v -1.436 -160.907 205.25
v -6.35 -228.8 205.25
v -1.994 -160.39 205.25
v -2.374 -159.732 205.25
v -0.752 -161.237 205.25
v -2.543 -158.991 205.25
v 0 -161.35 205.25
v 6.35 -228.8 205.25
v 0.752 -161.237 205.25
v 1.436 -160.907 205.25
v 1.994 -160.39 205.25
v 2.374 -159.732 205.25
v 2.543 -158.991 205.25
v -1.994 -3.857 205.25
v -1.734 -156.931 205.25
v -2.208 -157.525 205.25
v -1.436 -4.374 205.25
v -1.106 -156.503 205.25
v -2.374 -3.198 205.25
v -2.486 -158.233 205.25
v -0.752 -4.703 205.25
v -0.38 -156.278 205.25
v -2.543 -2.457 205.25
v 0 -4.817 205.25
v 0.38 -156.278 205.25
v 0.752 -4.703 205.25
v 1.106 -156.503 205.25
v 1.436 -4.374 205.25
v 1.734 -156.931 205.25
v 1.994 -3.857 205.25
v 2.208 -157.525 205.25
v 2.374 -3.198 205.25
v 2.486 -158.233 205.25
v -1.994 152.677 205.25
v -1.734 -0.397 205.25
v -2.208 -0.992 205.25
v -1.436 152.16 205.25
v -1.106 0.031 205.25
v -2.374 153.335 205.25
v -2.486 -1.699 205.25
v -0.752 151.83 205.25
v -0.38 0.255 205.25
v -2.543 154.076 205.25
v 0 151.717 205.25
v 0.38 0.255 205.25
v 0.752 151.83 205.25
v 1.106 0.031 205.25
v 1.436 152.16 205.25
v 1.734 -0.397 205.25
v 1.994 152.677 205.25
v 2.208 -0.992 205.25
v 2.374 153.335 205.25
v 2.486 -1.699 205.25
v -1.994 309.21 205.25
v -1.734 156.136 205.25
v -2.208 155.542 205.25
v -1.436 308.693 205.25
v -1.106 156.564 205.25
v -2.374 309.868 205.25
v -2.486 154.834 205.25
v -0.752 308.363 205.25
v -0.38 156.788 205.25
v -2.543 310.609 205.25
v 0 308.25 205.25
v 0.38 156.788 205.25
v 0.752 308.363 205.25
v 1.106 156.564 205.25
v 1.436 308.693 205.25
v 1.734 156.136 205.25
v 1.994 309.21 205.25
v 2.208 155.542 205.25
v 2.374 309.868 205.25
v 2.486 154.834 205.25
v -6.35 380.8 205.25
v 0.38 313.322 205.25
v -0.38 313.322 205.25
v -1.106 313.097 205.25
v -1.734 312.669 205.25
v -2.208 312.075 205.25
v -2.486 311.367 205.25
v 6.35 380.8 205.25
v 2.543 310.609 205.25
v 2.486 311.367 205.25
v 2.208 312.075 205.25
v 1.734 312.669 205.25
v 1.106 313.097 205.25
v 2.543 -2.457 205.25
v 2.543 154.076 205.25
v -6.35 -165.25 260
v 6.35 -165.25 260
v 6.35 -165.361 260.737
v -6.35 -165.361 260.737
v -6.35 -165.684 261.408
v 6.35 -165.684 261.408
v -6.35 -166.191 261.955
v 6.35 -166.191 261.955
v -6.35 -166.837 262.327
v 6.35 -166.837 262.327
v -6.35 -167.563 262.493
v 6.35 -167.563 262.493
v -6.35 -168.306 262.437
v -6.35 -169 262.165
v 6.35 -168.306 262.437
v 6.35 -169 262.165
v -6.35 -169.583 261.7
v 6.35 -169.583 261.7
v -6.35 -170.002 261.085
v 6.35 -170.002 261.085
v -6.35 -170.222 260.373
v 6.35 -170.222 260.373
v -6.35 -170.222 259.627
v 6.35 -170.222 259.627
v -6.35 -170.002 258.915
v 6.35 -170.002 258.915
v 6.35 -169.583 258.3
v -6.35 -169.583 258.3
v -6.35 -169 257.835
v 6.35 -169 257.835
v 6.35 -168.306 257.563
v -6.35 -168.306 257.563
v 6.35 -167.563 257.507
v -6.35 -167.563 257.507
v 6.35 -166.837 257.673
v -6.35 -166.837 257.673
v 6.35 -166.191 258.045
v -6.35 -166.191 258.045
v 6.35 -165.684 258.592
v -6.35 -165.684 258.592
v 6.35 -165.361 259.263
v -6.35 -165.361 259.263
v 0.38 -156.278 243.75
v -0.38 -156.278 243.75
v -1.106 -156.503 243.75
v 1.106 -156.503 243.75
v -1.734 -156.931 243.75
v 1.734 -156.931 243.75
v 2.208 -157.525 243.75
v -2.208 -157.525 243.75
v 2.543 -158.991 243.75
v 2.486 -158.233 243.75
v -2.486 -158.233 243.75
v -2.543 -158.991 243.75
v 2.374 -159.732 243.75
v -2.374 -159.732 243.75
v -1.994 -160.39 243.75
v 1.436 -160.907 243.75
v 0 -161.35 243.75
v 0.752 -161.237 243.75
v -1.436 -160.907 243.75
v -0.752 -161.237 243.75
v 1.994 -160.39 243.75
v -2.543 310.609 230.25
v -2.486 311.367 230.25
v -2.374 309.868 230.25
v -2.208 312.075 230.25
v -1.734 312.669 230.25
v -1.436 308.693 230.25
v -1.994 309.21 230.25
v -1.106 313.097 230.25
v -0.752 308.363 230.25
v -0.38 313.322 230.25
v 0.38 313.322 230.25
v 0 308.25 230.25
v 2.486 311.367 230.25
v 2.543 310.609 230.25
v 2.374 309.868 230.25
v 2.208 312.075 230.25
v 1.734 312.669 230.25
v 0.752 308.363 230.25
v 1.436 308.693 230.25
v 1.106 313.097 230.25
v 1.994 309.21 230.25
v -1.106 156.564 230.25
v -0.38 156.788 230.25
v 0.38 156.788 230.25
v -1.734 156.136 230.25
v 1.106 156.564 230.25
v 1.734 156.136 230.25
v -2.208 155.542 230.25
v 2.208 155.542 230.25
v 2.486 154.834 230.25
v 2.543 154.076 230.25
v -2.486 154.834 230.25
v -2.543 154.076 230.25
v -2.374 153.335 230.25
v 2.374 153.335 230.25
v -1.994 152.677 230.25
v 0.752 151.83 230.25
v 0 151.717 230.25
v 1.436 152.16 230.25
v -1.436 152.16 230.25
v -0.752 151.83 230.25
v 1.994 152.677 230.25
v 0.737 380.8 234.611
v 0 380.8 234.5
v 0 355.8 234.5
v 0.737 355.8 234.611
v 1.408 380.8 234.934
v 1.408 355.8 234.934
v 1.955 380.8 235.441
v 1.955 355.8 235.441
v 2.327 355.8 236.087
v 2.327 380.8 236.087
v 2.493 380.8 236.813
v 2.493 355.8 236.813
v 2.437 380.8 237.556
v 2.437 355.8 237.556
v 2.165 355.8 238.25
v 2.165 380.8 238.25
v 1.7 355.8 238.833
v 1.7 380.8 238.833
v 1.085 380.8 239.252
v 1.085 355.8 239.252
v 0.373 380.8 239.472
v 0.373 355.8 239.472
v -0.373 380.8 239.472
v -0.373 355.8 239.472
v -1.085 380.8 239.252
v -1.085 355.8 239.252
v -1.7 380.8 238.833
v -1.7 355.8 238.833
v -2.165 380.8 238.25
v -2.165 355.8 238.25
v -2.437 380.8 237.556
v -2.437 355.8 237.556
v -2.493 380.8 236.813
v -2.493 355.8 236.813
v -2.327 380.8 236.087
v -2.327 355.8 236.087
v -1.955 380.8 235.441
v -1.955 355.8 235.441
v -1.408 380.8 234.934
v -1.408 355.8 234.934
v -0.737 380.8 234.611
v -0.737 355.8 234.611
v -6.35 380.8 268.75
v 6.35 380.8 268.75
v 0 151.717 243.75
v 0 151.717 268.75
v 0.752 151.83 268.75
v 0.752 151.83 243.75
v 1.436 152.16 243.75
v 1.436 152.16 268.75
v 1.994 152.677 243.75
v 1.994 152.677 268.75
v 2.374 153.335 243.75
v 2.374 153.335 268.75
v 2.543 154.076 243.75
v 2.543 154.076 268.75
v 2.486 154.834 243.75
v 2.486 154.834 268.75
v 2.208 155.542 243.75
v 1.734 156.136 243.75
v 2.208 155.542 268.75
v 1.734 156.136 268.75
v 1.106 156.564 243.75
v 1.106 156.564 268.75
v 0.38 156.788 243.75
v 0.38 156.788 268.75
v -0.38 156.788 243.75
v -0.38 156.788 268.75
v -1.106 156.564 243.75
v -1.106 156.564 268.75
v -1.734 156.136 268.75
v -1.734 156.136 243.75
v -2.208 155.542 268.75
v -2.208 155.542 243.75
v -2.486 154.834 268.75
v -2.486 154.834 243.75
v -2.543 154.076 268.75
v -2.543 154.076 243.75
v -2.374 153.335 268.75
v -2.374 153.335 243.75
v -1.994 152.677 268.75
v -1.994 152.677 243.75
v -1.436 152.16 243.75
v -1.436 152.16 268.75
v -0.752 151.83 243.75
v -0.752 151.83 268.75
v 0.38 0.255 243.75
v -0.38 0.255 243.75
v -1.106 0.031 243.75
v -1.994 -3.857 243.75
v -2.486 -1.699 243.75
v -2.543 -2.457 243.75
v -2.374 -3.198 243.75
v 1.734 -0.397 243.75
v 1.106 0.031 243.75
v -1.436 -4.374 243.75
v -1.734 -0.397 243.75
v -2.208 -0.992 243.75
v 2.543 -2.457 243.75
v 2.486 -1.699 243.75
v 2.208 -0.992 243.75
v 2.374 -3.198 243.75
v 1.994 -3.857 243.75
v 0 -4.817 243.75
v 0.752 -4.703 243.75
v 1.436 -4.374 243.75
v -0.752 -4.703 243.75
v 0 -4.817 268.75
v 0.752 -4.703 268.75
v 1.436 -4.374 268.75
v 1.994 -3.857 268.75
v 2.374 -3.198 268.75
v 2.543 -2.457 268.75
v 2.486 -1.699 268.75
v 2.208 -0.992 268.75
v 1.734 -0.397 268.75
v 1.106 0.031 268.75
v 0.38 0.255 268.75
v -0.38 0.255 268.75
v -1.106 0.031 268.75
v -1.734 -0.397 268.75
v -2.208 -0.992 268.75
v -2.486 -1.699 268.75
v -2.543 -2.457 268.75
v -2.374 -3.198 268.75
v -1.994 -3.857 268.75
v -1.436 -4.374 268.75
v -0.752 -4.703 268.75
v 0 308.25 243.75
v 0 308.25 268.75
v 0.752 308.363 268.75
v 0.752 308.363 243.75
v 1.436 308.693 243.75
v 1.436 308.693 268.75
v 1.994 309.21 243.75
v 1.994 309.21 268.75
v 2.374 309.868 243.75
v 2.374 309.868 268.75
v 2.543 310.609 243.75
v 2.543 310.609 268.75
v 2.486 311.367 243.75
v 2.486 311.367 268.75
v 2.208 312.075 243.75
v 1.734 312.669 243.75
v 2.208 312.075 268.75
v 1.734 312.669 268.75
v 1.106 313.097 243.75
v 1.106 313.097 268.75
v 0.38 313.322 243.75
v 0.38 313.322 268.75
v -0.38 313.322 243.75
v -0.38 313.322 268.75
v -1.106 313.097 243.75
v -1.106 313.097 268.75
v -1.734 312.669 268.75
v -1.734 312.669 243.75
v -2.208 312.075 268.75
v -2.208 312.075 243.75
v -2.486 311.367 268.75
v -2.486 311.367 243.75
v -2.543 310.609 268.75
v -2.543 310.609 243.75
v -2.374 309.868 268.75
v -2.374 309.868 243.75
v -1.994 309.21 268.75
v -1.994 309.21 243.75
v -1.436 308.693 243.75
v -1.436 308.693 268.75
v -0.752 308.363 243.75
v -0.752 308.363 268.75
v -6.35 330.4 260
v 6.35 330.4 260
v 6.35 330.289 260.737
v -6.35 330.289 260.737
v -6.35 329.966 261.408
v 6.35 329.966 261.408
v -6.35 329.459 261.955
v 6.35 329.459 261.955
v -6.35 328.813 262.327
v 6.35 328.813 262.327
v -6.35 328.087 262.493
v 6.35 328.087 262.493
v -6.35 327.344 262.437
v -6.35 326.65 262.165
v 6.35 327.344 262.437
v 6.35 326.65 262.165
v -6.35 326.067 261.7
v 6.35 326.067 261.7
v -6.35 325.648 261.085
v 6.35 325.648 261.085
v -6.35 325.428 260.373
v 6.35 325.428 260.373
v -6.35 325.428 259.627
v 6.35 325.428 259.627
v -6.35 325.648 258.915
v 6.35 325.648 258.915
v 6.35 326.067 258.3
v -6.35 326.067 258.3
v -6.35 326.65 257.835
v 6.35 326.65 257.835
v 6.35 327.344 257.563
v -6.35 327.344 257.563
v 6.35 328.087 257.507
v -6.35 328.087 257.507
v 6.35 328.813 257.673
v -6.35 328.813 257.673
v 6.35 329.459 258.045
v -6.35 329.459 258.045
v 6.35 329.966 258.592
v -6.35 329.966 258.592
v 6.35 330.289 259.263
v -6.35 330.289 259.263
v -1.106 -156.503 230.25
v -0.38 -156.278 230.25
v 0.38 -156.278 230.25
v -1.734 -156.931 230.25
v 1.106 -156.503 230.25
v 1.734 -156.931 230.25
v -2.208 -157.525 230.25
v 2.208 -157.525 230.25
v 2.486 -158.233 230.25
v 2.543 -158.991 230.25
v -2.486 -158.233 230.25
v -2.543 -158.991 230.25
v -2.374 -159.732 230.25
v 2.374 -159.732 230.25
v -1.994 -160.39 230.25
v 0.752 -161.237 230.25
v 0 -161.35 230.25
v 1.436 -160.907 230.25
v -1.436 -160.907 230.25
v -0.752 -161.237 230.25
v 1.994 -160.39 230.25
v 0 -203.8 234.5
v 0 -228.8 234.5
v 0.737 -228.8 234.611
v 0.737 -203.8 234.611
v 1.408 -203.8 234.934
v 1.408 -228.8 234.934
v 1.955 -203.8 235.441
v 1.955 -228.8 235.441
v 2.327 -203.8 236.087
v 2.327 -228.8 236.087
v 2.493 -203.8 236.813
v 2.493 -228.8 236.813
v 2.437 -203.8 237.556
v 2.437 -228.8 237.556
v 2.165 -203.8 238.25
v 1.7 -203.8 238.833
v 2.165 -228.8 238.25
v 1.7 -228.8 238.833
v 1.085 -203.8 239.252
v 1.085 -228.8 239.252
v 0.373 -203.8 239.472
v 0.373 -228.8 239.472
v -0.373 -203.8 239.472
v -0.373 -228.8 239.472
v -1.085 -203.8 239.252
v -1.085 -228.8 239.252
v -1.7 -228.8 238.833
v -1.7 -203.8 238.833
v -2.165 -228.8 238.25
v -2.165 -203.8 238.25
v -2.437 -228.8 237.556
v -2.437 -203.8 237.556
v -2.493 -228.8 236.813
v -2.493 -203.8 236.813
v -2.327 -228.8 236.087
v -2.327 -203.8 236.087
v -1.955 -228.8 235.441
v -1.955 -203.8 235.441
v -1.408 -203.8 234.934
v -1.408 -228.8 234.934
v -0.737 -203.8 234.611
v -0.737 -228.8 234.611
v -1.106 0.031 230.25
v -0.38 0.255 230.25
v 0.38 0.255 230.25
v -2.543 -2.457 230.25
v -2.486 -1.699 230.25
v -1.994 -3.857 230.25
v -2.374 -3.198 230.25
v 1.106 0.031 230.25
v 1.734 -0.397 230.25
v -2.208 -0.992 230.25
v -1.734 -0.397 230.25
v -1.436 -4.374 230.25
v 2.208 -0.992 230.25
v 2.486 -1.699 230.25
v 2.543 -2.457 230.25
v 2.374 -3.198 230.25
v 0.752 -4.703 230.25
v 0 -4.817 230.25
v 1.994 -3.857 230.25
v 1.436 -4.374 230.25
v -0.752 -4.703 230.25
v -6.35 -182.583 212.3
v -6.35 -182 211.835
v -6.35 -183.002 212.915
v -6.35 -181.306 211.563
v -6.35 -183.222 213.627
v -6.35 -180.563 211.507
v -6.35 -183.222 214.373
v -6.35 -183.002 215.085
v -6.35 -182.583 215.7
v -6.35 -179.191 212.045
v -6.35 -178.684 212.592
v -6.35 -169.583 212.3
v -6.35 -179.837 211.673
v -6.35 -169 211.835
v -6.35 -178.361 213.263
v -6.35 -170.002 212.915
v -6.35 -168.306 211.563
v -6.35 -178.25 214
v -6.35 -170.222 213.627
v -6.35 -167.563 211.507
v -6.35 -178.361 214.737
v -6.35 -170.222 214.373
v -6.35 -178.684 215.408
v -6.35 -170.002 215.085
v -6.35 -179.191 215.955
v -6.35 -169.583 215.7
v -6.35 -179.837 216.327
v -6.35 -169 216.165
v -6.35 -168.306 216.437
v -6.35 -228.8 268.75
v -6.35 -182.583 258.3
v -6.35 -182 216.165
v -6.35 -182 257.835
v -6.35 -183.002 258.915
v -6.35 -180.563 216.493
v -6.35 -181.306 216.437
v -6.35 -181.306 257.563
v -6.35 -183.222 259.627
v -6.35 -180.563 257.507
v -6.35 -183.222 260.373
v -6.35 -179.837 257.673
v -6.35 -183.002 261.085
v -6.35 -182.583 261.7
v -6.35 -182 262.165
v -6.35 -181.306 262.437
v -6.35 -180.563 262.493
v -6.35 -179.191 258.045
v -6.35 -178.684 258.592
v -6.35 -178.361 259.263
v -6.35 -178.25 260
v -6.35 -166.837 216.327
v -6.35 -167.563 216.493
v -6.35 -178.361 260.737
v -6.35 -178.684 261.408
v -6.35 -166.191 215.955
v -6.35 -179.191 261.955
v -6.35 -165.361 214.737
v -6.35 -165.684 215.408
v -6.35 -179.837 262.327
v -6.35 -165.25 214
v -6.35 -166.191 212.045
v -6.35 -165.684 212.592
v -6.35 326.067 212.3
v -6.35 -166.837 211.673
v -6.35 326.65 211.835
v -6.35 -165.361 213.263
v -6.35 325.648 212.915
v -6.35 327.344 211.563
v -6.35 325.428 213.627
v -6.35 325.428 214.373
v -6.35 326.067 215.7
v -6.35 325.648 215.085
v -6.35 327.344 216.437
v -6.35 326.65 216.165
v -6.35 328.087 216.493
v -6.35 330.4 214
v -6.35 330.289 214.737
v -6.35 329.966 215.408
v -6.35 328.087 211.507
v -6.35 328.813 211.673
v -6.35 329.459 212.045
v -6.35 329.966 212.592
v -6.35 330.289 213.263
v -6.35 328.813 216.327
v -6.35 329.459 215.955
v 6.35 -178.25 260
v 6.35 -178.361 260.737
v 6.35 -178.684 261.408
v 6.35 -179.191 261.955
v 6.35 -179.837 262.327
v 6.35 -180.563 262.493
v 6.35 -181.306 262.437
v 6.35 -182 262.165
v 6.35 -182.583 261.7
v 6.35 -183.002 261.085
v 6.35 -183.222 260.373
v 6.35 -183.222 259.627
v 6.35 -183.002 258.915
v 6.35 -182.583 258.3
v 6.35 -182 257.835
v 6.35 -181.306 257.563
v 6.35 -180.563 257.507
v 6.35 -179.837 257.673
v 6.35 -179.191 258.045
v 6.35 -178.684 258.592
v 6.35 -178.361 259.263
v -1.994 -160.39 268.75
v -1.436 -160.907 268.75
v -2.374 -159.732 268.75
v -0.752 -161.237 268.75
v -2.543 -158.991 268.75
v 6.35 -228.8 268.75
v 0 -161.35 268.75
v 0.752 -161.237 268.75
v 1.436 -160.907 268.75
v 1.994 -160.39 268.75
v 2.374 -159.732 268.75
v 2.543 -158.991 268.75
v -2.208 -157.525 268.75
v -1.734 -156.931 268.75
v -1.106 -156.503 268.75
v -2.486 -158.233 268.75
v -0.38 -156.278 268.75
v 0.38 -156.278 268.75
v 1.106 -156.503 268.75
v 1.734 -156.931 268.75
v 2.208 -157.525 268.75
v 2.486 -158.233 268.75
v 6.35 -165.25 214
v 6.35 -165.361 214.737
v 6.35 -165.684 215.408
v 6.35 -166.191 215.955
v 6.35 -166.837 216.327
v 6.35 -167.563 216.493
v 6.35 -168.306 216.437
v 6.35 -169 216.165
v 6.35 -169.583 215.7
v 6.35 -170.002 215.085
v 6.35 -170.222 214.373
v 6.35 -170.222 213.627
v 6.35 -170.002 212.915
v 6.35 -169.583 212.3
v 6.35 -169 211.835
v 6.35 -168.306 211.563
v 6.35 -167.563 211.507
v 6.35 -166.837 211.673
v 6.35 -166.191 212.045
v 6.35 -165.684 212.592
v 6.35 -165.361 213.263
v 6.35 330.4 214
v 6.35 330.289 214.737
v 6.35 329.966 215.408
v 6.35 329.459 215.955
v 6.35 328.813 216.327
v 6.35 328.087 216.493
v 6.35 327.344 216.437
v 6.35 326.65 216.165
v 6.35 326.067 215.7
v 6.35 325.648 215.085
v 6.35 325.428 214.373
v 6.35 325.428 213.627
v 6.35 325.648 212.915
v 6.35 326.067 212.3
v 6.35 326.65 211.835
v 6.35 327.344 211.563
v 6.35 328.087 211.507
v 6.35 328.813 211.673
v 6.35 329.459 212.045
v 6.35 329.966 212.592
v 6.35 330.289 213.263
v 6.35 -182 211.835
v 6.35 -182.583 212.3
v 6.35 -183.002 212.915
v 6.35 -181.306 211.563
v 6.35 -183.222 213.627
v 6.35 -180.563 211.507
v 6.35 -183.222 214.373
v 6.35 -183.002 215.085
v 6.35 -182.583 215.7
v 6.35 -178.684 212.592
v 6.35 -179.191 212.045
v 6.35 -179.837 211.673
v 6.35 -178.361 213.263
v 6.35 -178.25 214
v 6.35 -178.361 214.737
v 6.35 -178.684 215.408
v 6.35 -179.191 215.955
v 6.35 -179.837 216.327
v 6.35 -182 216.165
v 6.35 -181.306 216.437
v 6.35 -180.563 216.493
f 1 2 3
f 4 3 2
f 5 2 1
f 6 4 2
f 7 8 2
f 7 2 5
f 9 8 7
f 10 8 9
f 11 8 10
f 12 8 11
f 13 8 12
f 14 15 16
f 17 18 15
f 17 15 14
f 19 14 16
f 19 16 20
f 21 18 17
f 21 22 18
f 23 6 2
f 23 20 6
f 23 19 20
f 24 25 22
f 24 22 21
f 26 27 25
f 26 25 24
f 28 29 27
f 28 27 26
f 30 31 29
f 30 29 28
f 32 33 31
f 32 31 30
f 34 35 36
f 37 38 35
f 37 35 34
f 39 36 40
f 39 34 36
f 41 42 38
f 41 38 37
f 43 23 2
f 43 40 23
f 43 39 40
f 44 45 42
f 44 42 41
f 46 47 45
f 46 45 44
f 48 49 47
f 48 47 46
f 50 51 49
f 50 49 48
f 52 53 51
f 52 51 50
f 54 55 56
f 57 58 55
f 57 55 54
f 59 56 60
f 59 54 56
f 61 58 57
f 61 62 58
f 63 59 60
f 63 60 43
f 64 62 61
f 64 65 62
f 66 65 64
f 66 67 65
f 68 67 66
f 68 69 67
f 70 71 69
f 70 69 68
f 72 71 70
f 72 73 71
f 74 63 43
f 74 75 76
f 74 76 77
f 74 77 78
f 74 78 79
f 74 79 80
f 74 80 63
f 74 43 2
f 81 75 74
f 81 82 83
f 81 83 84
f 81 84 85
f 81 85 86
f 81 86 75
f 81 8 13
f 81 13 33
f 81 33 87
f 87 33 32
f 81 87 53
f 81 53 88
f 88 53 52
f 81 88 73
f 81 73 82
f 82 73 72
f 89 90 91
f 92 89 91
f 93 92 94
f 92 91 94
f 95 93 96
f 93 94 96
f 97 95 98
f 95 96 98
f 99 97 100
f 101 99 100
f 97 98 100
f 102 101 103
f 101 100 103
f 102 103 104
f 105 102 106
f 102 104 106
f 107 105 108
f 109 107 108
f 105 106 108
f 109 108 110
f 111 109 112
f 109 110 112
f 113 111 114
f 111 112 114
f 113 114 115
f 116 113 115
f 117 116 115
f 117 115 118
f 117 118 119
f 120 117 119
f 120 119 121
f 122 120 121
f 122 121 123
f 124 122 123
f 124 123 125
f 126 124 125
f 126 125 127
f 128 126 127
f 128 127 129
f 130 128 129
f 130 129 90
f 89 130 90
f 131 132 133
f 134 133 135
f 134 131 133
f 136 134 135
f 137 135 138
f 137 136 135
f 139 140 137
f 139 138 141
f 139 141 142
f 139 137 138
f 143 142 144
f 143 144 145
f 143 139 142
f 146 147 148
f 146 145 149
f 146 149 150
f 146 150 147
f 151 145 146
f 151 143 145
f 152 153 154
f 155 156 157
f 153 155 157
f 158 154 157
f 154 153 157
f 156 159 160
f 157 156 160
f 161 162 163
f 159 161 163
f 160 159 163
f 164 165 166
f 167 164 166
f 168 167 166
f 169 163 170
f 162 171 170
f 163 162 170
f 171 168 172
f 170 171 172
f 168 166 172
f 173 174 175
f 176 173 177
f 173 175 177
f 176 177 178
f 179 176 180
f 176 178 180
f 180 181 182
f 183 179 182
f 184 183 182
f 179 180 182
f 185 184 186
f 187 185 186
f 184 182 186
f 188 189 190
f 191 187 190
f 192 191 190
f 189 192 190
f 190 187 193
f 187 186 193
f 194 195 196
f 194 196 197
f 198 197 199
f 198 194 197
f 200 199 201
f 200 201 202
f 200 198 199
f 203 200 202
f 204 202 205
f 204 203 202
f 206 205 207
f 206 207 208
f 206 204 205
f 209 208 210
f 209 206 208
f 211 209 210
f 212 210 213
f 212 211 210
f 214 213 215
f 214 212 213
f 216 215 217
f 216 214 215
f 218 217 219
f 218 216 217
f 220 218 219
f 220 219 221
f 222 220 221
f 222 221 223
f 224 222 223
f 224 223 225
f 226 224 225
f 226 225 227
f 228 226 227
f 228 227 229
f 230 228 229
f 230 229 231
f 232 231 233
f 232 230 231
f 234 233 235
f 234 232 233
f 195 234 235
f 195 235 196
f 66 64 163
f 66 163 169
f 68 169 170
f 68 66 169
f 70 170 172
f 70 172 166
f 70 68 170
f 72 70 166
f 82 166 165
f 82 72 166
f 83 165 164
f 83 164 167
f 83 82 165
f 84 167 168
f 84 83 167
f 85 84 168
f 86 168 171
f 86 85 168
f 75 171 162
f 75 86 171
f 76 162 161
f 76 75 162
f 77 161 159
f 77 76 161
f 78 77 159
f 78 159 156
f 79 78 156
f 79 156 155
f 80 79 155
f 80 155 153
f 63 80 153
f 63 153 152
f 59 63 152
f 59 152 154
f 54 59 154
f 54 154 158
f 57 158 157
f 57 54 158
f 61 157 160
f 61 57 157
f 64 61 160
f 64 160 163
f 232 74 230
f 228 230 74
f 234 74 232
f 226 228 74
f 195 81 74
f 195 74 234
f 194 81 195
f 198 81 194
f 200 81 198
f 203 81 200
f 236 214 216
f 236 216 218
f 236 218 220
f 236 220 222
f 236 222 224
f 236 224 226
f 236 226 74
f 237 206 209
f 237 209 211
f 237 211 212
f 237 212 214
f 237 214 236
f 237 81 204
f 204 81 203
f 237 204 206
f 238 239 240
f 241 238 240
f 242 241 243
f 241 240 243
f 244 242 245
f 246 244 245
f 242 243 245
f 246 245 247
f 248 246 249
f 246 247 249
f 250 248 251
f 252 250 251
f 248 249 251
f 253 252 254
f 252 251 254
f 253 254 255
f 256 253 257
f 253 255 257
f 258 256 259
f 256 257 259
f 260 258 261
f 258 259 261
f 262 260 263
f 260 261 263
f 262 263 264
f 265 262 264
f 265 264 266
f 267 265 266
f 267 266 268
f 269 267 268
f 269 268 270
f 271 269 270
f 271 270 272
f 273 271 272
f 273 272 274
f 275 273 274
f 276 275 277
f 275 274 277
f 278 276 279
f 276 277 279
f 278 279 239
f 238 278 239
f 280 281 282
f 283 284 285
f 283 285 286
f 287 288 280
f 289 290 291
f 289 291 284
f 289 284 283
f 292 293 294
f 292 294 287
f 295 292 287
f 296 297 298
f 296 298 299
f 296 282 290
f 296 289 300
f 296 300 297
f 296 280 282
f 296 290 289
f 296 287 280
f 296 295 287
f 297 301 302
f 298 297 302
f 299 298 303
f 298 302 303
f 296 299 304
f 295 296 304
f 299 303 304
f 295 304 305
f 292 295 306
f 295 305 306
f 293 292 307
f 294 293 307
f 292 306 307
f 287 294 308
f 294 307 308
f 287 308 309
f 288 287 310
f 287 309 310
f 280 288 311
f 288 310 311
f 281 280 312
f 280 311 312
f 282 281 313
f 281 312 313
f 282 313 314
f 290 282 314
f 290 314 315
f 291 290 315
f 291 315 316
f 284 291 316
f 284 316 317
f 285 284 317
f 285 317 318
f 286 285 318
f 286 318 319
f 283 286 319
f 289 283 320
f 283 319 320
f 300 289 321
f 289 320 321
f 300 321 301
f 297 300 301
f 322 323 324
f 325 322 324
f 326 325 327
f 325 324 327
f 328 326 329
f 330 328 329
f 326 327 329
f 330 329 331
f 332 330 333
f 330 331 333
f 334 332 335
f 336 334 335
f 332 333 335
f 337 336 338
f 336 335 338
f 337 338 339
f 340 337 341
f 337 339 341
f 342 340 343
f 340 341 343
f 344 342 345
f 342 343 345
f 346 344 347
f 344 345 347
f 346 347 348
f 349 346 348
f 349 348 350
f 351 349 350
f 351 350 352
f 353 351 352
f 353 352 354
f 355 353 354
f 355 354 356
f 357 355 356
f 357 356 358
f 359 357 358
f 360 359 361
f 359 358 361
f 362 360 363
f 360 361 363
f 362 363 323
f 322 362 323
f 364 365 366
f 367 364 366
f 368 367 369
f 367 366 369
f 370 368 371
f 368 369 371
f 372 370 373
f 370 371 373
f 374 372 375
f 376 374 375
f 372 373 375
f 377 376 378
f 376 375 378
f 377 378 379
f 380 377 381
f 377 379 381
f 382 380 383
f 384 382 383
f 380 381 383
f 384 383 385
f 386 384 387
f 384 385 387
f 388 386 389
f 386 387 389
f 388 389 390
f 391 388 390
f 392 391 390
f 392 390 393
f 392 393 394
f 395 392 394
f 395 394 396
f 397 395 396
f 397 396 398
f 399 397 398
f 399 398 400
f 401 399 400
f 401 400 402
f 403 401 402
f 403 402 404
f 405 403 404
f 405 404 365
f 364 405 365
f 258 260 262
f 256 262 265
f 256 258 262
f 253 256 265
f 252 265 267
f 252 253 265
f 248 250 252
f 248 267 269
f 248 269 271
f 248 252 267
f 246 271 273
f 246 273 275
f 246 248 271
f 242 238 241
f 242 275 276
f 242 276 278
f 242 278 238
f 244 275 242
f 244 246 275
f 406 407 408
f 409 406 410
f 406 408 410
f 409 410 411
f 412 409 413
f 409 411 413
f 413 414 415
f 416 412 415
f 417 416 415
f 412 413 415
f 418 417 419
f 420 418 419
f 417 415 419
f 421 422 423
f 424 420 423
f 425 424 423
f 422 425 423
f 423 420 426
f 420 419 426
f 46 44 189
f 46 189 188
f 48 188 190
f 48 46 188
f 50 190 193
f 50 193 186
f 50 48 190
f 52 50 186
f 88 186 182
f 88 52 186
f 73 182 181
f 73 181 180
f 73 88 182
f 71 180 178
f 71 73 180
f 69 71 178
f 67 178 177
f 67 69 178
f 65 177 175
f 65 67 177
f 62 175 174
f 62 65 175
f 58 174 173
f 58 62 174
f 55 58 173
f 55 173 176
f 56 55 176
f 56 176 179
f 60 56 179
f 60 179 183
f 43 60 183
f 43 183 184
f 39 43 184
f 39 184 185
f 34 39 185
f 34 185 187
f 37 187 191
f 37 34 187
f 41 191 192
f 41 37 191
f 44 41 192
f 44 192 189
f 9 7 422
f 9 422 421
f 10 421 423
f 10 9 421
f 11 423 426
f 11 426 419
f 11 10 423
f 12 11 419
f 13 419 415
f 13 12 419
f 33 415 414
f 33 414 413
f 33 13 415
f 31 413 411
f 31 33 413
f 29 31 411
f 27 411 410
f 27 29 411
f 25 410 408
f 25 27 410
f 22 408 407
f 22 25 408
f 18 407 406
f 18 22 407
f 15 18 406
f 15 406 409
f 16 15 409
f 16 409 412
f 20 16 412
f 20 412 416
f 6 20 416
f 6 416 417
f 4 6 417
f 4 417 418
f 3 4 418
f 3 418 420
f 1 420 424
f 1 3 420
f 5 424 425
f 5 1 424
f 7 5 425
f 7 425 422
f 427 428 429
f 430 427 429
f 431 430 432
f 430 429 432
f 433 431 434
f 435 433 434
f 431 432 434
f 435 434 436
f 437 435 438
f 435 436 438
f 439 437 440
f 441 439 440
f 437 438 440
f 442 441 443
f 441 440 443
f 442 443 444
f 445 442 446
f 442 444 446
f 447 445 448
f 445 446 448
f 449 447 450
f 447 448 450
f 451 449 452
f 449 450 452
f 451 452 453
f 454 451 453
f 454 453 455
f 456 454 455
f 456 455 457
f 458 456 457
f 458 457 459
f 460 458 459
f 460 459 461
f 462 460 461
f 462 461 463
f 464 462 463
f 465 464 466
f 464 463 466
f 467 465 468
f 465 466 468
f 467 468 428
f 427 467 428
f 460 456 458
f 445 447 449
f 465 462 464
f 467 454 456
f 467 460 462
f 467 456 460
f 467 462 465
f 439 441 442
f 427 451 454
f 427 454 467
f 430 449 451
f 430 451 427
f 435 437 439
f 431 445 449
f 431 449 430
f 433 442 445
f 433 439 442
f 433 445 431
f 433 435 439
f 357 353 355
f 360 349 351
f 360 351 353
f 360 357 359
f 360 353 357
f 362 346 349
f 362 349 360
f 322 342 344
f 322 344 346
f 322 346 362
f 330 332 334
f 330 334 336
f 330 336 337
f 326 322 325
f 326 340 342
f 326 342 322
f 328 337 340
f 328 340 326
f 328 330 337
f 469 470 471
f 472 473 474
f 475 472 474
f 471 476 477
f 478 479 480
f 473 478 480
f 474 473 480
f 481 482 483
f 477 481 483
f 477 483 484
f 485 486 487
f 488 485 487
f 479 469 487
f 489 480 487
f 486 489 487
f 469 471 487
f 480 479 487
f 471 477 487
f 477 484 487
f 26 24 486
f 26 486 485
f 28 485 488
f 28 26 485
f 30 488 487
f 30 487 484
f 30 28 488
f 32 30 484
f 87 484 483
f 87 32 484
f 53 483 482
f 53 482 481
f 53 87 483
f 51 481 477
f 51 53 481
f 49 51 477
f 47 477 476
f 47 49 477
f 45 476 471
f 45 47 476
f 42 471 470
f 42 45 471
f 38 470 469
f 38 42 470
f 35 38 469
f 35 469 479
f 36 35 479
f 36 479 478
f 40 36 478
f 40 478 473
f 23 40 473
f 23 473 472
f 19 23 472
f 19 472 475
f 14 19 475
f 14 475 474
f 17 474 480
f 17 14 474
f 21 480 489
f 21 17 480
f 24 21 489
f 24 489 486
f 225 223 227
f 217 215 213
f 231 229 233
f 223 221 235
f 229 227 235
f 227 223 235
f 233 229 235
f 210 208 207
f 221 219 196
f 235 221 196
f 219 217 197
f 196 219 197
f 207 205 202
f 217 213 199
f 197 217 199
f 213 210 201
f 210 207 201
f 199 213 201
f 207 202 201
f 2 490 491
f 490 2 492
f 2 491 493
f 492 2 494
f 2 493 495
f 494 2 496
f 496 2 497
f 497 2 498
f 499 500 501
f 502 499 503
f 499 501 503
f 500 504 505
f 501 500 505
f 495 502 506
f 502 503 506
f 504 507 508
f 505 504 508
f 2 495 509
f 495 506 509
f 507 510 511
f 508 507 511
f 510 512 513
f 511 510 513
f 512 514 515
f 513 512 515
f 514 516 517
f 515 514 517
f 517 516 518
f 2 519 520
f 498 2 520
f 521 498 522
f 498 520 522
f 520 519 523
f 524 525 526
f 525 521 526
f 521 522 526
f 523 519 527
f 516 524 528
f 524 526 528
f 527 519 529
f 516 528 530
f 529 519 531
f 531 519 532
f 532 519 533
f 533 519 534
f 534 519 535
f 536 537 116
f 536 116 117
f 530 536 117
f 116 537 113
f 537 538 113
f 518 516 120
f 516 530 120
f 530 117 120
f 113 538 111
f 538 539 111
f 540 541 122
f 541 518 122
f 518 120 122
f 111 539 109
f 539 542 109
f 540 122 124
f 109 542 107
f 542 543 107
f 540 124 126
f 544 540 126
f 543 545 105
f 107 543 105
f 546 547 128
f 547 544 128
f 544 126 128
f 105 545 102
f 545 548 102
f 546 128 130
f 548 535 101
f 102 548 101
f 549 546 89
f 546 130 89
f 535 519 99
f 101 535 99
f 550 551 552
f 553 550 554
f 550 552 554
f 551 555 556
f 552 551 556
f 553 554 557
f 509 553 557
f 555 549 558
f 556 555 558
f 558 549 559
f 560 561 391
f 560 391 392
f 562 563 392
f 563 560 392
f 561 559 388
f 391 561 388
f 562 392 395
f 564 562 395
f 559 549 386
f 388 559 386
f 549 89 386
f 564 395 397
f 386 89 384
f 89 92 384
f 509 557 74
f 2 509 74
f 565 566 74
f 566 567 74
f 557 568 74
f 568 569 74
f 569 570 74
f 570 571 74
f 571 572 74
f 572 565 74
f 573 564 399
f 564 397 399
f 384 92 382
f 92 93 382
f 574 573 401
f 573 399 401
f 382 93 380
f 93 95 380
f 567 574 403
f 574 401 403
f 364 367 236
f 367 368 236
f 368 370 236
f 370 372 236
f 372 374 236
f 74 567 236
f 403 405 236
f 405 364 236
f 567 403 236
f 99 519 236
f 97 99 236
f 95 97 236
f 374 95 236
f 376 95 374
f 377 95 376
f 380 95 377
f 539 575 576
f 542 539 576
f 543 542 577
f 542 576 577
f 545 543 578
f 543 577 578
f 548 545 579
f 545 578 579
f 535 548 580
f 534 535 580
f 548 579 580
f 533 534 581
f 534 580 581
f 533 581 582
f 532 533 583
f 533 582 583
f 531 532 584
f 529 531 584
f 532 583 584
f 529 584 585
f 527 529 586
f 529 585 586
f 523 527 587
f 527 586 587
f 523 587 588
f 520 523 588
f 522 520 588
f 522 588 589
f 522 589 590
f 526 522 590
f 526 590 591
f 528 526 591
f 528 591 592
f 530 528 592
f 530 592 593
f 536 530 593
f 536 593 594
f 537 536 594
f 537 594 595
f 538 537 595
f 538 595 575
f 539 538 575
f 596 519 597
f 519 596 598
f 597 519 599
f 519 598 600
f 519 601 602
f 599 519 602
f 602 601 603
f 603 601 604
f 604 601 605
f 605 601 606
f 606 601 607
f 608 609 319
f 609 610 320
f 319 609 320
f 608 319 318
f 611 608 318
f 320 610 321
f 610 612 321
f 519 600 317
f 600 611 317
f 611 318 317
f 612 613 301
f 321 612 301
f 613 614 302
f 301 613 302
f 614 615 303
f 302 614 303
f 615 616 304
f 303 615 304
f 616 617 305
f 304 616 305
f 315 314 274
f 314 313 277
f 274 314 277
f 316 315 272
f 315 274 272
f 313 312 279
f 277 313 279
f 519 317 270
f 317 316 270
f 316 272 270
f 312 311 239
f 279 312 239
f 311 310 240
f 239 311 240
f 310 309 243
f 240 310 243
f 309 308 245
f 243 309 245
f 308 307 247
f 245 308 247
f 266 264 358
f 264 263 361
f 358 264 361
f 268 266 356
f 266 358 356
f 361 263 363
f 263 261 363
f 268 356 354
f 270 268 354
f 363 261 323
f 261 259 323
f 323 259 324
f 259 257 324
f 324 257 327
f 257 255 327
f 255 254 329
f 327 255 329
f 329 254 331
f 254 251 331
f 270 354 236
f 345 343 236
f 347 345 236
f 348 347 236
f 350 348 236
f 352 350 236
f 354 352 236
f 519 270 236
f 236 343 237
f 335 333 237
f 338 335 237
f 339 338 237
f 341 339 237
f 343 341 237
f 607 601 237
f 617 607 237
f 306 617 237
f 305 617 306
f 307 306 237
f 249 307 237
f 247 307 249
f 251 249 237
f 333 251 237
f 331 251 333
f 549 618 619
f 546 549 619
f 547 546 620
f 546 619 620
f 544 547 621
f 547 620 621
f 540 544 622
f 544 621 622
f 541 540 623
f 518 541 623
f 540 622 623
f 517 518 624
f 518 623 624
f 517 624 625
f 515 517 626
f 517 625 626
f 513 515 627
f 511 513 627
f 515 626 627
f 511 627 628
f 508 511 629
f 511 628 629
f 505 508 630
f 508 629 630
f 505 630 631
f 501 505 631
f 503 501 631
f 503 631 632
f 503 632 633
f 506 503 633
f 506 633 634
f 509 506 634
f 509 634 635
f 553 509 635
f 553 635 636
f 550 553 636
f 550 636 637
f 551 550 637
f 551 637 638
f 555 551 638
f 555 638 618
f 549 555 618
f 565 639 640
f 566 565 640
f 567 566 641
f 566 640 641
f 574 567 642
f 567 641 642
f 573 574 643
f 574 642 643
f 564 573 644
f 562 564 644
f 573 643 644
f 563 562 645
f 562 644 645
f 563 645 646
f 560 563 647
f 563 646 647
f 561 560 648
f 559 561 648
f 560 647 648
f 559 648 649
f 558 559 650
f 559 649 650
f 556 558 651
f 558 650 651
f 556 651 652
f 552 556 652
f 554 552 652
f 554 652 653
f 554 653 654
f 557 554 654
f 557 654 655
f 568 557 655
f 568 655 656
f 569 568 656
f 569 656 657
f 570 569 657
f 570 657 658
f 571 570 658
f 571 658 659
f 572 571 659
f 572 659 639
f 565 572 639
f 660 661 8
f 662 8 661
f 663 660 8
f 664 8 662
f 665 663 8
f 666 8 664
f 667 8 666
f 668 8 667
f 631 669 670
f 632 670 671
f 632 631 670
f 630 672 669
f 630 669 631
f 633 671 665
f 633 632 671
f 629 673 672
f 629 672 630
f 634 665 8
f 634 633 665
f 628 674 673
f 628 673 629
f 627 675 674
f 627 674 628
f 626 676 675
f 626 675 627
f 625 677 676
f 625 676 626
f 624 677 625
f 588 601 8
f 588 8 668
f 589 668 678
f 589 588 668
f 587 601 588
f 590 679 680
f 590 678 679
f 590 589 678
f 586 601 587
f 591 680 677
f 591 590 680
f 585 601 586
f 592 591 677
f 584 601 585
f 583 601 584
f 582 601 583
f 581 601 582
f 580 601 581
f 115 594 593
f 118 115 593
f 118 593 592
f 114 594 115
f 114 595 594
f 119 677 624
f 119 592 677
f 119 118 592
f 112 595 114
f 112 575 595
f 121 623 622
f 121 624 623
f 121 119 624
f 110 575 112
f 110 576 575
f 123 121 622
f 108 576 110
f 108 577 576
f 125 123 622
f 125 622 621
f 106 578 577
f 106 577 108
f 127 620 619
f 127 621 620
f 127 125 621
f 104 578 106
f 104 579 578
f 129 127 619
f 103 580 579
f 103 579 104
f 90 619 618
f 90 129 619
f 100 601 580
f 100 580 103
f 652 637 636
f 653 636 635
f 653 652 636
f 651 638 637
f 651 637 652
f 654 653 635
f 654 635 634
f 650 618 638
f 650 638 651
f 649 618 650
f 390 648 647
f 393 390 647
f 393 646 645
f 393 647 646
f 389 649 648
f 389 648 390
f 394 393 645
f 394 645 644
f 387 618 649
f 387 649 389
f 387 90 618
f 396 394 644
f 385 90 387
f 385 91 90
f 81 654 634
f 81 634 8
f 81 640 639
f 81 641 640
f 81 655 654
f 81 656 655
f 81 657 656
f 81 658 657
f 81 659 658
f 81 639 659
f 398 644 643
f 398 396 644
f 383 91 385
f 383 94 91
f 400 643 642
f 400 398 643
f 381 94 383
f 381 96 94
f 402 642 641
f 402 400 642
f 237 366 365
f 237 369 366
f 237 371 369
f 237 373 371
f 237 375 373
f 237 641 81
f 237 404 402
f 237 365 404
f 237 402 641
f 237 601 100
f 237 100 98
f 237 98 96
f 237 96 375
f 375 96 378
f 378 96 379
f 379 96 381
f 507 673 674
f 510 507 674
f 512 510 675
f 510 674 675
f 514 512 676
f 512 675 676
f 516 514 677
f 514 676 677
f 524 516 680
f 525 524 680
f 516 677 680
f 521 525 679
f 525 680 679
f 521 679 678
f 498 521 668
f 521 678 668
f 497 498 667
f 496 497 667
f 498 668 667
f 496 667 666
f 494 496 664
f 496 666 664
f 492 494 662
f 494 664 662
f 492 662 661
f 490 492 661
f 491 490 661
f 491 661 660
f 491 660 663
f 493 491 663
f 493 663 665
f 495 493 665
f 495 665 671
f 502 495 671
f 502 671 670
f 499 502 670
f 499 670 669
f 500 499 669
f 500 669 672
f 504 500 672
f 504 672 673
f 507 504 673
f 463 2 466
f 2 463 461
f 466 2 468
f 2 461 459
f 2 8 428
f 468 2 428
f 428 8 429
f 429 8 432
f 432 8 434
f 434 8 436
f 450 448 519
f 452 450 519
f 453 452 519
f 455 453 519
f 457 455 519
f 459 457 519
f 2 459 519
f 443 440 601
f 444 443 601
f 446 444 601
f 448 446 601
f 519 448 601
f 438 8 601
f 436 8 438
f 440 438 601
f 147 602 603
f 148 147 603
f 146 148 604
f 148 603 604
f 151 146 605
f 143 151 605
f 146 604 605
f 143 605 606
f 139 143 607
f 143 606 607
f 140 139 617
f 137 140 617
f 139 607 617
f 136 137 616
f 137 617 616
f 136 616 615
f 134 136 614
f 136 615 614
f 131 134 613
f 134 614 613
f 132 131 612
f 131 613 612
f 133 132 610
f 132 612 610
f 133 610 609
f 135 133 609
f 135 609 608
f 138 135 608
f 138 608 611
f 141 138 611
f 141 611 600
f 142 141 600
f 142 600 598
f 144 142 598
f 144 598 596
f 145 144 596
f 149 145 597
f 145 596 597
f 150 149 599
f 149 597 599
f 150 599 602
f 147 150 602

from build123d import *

# Parameters (mm, degrees)
SKETCH006_W     = 609.6
SKETCH006_H     = 63.5
PAD002_DEPTH    = 6.35
SKETCH007_R     = 2.5
POCKET001_DEPTH = 25
SKETCH008_R     = 2.55
POCKET002_DEPTH = 25
SKETCH016_R     = 2.5
POCKET007_DEPTH = 12.701


with BuildPart() as part:
    # Sketch006 → Pad002 (new body, symmetric)
    with BuildSketch(Plane.YZ):
        Rectangle(SKETCH006_W, SKETCH006_H)
    extrude(amount=PAD002_DEPTH, both=True)

    # Sketch007 (on Face4 of Pad002) → Pocket001 (cut)
    with BuildSketch(Plane(origin=(0, -304.8, 0), x_dir=(0, 0, -1), z_dir=(0, -1, 0))):
        Circle(SKETCH007_R)
    pocket001 = extrude(amount=-POCKET001_DEPTH, mode=Mode.SUBTRACT)

    # Mirrored001: Pocket001 across XZ
    add(pocket001.mirror(Plane.XZ), mode=Mode.SUBTRACT)

    # Sketch008 → Pocket002 (cut)
    with BuildSketch(Plane(origin=(0, 0, 31.75), x_dir=(0, -1, 0), z_dir=(0, 0, 1))):
        with Locations((-234.8, 0)):
            Circle(SKETCH008_R)
        with Locations((-78.266667, 0)):
            Circle(SKETCH008_R)
        with Locations((78.266667, 0)):
            Circle(SKETCH008_R)
        with Locations((234.8, 0)):
            Circle(SKETCH008_R)
    pocket002 = extrude(amount=-POCKET002_DEPTH, mode=Mode.SUBTRACT)

    # Mirrored: Pocket002 across XY
    add(pocket002.mirror(Plane.XY), mode=Mode.SUBTRACT)

    # Sketch016 (on Face4 of Mirrored) → Pocket007 (cut, through all)
    with BuildSketch(Plane.YZ.offset(6.35)):
        with Locations((-256.75, 23)):
            Circle(SKETCH016_R)
        with Locations((-256.75, -23)):
            Circle(SKETCH016_R)
        with Locations((-243.75, 23)):
            Circle(SKETCH016_R)
        with Locations((-243.75, -23)):
            Circle(SKETCH016_R)
        with Locations((251.9, 23)):
            Circle(SKETCH016_R)
        with Locations((251.9, -23)):
            Circle(SKETCH016_R)
    extrude(amount=-POCKET007_DEPTH, mode=Mode.SUBTRACT)


with BuildPart() as part_1:
    # Body002 placement: moved
    add(part.part.moved(Location((0, 76, 237))))


solid = part_1.part
